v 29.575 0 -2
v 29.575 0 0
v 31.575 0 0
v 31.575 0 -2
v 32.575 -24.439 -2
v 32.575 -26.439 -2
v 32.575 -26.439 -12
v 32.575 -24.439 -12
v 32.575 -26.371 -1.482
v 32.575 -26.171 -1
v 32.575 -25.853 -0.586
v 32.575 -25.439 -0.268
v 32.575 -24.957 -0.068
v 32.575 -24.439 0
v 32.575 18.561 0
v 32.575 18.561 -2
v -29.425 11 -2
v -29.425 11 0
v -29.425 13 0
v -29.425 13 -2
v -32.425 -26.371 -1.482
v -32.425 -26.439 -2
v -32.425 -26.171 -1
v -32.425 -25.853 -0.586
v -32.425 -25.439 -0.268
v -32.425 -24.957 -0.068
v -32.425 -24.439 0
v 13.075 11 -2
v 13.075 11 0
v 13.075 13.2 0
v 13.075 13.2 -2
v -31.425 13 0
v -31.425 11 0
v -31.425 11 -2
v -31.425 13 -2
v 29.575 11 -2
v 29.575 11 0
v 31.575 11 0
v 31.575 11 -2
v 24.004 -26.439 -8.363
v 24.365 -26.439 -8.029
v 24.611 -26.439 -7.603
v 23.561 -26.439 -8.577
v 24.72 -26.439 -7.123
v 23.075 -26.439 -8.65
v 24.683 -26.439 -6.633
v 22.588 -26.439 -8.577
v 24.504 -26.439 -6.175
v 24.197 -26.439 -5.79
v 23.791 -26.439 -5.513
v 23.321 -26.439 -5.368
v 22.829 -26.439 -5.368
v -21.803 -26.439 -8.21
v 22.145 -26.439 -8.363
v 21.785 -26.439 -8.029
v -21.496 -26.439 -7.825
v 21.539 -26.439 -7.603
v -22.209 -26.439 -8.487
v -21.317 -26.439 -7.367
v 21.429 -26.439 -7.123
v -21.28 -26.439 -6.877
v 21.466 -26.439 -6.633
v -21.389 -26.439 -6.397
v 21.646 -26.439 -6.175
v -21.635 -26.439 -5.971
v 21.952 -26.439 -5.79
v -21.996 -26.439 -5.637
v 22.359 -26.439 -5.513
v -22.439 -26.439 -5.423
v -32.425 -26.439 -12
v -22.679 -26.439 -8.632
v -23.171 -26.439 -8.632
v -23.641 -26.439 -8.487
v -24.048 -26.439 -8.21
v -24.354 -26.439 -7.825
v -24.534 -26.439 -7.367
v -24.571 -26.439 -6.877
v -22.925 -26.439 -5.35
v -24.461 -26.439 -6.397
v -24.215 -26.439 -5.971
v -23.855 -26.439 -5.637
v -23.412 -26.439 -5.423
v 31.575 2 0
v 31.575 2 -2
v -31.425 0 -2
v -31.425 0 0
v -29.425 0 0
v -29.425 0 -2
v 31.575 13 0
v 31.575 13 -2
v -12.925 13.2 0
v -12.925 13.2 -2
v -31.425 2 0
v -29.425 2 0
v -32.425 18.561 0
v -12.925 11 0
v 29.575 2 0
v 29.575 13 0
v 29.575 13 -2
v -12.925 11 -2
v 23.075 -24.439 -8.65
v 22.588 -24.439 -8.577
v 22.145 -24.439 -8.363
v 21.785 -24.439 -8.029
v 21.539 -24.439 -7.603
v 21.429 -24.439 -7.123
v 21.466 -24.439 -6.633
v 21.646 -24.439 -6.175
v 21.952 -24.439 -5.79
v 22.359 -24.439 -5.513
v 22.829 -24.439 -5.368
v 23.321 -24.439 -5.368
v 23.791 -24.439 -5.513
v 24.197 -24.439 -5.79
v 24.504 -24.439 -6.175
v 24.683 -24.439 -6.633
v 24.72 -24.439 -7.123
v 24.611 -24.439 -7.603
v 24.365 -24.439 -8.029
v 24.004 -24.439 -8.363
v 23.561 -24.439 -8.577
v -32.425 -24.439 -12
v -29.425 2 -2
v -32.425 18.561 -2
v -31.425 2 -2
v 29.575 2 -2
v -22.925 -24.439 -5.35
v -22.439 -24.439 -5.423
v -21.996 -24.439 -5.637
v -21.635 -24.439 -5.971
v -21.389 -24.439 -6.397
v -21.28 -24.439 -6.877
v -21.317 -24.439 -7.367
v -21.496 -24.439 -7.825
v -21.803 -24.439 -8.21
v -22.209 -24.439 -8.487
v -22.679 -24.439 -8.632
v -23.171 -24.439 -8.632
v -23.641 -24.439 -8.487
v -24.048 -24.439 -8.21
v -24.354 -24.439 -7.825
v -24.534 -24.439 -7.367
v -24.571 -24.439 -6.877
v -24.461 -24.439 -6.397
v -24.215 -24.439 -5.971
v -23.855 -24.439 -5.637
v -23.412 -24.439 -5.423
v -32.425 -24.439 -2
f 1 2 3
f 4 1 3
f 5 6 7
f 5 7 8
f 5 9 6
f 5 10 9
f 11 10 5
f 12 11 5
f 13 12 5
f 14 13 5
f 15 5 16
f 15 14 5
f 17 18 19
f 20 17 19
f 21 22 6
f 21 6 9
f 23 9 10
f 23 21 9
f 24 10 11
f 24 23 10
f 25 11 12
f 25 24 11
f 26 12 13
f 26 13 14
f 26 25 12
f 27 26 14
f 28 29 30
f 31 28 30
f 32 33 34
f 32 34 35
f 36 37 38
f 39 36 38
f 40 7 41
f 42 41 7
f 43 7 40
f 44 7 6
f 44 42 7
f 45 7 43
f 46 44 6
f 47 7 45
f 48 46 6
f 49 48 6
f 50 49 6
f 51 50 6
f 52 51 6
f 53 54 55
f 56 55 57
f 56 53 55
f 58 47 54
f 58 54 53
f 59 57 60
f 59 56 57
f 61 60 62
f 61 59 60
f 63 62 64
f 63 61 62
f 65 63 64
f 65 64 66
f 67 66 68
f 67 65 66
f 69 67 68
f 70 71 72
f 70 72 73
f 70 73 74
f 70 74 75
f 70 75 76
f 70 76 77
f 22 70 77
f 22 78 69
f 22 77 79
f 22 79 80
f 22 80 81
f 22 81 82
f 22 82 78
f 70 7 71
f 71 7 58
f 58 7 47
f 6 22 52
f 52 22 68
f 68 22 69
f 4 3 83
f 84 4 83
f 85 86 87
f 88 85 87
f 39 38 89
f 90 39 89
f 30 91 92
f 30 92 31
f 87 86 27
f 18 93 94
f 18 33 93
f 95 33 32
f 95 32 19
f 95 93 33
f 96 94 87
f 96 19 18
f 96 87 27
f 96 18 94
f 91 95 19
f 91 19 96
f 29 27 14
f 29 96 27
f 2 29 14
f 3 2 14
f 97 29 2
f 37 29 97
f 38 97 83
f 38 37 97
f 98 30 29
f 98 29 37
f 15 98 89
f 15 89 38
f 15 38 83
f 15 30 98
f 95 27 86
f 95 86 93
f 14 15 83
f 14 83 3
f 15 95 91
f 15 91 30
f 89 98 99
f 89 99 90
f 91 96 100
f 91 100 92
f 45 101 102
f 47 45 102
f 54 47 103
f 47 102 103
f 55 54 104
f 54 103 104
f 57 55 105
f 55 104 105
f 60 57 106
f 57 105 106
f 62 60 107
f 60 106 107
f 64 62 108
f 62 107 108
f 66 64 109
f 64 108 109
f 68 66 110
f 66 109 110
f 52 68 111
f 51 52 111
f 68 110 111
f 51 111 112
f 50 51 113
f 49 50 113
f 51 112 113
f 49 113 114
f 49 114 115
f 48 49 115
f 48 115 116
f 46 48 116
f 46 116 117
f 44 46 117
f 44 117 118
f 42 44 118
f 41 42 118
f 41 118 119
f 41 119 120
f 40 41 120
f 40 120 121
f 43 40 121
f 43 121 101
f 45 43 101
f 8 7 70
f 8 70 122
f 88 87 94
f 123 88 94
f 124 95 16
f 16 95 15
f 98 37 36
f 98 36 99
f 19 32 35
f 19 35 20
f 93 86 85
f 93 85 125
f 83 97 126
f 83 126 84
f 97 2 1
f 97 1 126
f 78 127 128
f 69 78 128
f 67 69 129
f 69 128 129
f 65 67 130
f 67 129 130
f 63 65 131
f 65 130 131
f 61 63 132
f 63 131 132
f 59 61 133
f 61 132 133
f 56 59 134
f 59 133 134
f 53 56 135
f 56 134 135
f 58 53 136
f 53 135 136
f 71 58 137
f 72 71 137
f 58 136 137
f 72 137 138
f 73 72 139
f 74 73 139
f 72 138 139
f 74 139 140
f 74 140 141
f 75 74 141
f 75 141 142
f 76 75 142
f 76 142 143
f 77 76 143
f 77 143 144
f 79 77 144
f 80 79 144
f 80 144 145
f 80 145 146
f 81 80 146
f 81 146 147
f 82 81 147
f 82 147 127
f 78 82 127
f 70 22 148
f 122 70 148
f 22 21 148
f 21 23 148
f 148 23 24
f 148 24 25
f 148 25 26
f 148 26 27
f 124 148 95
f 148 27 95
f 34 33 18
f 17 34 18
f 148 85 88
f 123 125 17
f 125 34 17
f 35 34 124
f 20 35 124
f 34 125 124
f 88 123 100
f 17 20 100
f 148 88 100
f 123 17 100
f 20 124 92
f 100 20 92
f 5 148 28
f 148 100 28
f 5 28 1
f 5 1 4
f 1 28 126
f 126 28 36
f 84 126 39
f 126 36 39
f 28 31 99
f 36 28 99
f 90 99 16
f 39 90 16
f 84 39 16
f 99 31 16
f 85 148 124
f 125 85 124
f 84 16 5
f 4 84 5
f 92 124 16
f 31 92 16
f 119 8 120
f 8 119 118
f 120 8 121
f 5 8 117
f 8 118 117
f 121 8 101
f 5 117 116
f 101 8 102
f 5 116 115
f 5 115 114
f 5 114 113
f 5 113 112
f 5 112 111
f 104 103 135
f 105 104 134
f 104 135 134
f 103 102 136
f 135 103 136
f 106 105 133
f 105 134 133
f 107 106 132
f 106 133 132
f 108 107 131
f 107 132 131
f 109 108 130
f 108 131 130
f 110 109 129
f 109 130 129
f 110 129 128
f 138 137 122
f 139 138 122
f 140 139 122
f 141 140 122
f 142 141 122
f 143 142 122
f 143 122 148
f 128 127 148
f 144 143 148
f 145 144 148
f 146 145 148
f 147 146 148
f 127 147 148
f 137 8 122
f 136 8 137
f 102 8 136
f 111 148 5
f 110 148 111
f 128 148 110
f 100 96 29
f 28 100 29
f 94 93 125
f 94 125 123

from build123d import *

# Parameters (mm, degrees)
SKETCH_1_W                   = 65
SKETCH_1_H                   = 45
SM_BASE_FLANGE_1_DEPTH       = 2
SM_START                     = -32.425287356
SM_EDGE_FLANGE_1_DEPTH       = 65
SM_EDGE_FLANGE_1_2_OUTLINE_W = 2
SM_EDGE_FLANGE_1_2_OUTLINE_H = 10
SM_EDGE_FLANGE_1_2_DEPTH     = 65
SKETCH_9_W                   = 2
SKETCH_9_H                   = 2
SKETCH_9_W_2                 = 26
SKETCH_9_H_2                 = 2.2
CUT_EXTRUDE_1_DEPTH          = 10
SKETCH_11_R                  = 1.65
CUT_EXTRUDE_3_DEPTH          = 10


# Read off the part's stored shape, not the designer's step: 边线-法兰1
# Sheet-metal steps are written as plain solids
with BuildPart() as part:
    # Sketch 1 → 基体-法兰1 (new body)
    with BuildSketch(Plane.XY):
        with Locations((0.074712644, -3.939027096)):
            Rectangle(SKETCH_1_W, SKETCH_1_H)
    extrude(amount=-SM_BASE_FLANGE_1_DEPTH)

    # 边线-法兰1 outline → 边线-法兰1 (cut)
    with BuildSketch(Plane.YZ.offset(SM_START)):
        with BuildLine():
            ThreePointArc((-26.439027096, -2), (-25.853240658, -0.585786437), (-24.439027096, 0))
            Line((-24.439027096, 0), (-26.439027096, 0))
            Line((-26.439027096, 0), (-26.439027096, -2))
        make_face()
    extrude(amount=SM_EDGE_FLANGE_1_DEPTH, mode=Mode.SUBTRACT)

    # Sm Edge Flange 1 2 outline → Sm Edge Flange 1 2 (add)
    with BuildSketch(Plane.YZ.offset(SM_START)):
        with Locations((-25.439027096, -7)):
            Rectangle(SM_EDGE_FLANGE_1_2_OUTLINE_W, SM_EDGE_FLANGE_1_2_OUTLINE_H)
    extrude(amount=SM_EDGE_FLANGE_1_2_DEPTH)

    # 草图9 → 切除-拉伸1 (cut)
    with BuildSketch(Plane.XY):
        with Locations((-30.425287356, 1)):
            Rectangle(SKETCH_9_W, SKETCH_9_H)
        with Locations((0.074712644, 12.1)):
            Rectangle(SKETCH_9_W_2, SKETCH_9_H_2)
        with Locations((30.574712644, 12)):
            Rectangle(SKETCH_9_W, SKETCH_9_H)
        with Locations((-30.425287356, 12)):
            Rectangle(SKETCH_9_W, SKETCH_9_H)
        with Locations((30.574712644, 1)):
            Rectangle(SKETCH_9_W, SKETCH_9_H)
    extrude(amount=-CUT_EXTRUDE_1_DEPTH, mode=Mode.SUBTRACT)

    # 草图11 → 切除-拉伸3 (cut)
    with BuildSketch(Plane(origin=(0, -24.439027096, 0), x_dir=(1, 0, 0), z_dir=(0, 1, 0))):
        with Locations(Location((-22.925287356, 7, 0), (0, 0, 270))):
            Circle(SKETCH_11_R)
        with Locations(Location((23.074712644, 7, 0), (0, 0, 90))):
            Circle(SKETCH_11_R)
    extrude(amount=-CUT_EXTRUDE_3_DEPTH, mode=Mode.SUBTRACT)


solid = part.part
